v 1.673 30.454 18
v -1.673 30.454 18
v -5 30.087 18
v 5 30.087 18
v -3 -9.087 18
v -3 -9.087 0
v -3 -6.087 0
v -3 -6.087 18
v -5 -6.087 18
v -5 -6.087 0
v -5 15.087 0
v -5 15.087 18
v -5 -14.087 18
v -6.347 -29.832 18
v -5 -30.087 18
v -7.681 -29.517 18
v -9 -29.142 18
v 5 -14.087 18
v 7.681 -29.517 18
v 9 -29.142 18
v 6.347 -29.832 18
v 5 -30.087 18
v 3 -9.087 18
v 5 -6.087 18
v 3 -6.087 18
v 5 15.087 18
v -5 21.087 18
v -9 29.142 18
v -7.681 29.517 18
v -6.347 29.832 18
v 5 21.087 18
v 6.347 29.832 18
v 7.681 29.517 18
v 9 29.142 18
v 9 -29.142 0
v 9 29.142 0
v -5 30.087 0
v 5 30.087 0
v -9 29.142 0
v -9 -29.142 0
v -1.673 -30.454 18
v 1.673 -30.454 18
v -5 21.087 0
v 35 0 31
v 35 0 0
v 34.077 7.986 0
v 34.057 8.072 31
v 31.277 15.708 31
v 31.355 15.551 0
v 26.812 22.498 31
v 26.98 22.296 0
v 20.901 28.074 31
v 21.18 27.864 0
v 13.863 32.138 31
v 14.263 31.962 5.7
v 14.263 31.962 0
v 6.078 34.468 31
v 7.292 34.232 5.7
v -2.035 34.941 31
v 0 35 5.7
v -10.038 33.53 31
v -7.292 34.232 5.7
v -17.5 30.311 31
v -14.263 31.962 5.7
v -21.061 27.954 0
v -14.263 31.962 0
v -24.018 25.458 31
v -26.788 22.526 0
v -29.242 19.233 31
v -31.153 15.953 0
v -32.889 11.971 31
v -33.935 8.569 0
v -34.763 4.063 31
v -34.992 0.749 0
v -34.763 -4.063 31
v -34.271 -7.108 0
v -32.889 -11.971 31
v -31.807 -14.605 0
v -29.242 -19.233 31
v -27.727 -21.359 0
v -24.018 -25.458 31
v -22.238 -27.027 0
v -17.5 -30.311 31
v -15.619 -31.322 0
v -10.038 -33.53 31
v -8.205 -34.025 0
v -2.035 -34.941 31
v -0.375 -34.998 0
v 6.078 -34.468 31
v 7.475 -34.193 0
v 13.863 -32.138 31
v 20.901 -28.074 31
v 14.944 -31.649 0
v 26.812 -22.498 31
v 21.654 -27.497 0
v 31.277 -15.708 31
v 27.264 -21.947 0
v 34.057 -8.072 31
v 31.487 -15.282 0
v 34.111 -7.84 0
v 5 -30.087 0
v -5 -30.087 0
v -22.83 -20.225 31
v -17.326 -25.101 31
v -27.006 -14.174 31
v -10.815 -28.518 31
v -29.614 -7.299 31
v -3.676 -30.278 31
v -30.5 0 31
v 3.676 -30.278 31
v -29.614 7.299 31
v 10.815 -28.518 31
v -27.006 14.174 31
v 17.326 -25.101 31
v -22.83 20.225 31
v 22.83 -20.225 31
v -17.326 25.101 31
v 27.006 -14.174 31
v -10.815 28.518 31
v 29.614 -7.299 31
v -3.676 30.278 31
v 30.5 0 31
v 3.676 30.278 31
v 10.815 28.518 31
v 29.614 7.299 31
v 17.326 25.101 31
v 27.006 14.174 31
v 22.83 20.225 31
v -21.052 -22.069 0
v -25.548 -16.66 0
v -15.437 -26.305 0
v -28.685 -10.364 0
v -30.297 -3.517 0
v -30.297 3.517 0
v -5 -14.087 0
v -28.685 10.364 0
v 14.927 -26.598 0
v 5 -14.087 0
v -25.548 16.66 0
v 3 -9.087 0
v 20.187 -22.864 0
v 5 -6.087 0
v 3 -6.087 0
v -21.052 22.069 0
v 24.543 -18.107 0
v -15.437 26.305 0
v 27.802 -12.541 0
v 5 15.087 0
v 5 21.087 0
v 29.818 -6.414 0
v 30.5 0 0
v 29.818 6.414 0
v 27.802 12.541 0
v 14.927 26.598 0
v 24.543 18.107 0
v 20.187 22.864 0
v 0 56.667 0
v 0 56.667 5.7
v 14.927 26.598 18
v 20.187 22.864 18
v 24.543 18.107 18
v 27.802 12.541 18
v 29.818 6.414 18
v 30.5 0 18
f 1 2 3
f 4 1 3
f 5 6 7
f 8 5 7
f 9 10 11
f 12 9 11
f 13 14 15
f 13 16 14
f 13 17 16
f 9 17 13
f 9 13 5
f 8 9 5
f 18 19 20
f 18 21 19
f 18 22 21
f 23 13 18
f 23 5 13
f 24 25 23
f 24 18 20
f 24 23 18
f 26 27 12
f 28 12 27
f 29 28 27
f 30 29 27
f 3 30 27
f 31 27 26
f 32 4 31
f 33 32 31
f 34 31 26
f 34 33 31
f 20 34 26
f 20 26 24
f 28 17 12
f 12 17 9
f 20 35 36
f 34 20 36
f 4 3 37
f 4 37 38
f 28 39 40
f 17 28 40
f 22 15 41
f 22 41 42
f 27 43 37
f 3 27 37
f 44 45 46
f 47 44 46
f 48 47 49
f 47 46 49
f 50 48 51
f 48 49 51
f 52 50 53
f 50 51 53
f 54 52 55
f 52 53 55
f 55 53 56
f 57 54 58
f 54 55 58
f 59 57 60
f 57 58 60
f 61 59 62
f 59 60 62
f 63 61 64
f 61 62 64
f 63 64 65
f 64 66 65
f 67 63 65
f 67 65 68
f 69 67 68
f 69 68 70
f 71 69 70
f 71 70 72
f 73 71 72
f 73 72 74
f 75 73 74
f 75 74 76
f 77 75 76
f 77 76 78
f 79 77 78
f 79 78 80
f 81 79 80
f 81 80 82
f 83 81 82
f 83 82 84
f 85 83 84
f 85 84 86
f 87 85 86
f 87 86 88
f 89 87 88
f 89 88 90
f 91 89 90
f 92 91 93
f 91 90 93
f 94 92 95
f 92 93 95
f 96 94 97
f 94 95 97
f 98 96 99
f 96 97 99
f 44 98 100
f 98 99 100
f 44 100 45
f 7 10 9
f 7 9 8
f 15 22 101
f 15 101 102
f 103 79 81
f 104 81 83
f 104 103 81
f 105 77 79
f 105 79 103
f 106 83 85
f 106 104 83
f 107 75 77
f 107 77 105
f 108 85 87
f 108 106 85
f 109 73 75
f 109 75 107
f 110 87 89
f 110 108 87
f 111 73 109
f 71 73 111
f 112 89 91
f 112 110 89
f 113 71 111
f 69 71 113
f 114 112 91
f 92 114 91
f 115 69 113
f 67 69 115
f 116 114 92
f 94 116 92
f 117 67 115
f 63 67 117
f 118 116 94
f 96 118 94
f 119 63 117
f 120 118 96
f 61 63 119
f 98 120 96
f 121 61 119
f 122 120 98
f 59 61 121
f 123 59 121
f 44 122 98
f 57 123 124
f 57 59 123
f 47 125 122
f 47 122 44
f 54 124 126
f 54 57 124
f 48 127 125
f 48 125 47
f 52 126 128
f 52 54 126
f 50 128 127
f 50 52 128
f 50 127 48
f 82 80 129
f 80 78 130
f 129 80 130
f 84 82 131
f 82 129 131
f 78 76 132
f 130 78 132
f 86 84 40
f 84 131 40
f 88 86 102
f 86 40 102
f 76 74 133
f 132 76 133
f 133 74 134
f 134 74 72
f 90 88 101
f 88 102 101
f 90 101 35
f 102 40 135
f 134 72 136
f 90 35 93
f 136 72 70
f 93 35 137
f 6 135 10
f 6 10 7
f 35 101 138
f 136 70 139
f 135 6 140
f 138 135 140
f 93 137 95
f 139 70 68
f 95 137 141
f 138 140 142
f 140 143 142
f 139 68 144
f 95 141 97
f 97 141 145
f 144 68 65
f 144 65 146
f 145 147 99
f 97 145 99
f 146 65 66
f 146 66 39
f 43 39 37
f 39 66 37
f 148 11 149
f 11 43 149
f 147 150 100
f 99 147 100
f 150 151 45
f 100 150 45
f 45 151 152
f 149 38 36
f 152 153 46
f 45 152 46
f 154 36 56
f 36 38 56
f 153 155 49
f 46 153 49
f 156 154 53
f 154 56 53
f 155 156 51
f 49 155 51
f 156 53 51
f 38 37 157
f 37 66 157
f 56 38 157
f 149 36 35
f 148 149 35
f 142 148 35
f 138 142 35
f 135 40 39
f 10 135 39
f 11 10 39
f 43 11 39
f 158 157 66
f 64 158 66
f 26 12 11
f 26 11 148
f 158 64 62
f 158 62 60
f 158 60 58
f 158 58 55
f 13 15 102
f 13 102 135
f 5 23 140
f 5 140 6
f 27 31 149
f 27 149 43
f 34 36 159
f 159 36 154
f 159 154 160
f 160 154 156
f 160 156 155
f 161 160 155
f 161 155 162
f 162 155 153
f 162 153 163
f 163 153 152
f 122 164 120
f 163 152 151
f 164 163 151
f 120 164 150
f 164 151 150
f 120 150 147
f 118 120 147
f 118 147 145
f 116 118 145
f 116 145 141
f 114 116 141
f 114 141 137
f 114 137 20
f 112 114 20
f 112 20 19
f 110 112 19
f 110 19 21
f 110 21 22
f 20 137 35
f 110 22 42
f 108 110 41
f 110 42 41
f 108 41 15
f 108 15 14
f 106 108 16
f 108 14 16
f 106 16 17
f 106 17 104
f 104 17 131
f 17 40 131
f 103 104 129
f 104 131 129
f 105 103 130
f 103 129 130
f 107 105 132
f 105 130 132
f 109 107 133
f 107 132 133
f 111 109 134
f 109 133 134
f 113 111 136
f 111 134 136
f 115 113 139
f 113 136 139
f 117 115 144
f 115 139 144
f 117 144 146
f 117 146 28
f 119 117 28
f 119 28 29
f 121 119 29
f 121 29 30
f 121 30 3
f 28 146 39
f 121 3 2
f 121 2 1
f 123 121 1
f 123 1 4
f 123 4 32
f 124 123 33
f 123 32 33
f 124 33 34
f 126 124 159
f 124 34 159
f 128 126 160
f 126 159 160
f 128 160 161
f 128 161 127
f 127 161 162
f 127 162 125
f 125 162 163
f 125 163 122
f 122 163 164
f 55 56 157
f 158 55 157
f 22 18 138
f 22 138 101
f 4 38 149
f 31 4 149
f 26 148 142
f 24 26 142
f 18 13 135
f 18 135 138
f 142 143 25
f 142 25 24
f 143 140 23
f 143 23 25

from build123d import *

# Parameters (mm, degrees)
F0_R     = 35
F0_W     = 2
F0_H     = 3
F1_DEPTH = 18
F2_R     = 35
F2_R_2   = 30.5
F3_DEPTH = 31
F5_DEPTH = 5.7


with BuildPart() as f1:
    # F0 (on Top) → F1 (new body)
    with BuildSketch(Plane.XY):
        Circle(F0_R)
        with BuildLine():
            ThreePointArc((-5, 30.0873727667), (0, 30.5), (5, 30.0873727667))
            Line((5, 30.0873727667), (9, 30.0873727667))
            Line((9, 30.0873727667), (9, 29.1418942418))
            ThreePointArc((9, 29.1418942418), (24.5433290325, 18.1073189622), (30.5, 0))
            ThreePointArc((30.5, 0), (24.5433290325, -18.1073189622), (9, -29.1418942418))
            ThreePointArc((9, -29.1418942418), (7.0159448694, -29.6820908561), (5, -30.0873727667))
            ThreePointArc((5, -30.0873727667), (0, -30.5), (-5, -30.0873727667))
            Line((-5, -30.0873727667), (-9, -30.0876272333))
            Line((-9, -30.0876272333), (-9, -29.1418942418))
            ThreePointArc((-9, -29.1418942418), (-30.5, 0), (-9, 29.1418942418))
            Line((-9, 29.1418942418), (-9, 30.0873727667))
            Line((-9, 30.0873727667), (-5, 30.0873727667))
        make_face(mode=Mode.SUBTRACT)
        with BuildLine():
            Line((-5, 30.0873727667), (5, 30.0873727667))
            ThreePointArc((5, 30.0873727667), (0, 30.5), (-5, 30.0873727667))
        make_face()
        with BuildLine():
            Line((9, 30.0873727667), (5, 30.0873727667))
            ThreePointArc((5, 30.0873727667), (7.0159448694, 29.6820908561), (9, 29.1418942418))
            Line((9, 29.1418942418), (9, 30.0873727667))
        make_face()
        with BuildLine():
            ThreePointArc((9, 29.1418942418), (7.0159448694, 29.6820908561), (5, 30.0873727667))
            Line((5, 30.0873727667), (5, 21.0873727667))
            Line((5, 21.0873727667), (5, 15.0873727667))
            Line((5, 15.0873727667), (5, -6.0873727667))
            Line((5, -6.0873727667), (5, -9.0873727667))
            Line((5, -9.0873727667), (5, -14.0873727667))
            Line((5, -14.0873727667), (5, -30.0873727667))
            ThreePointArc((5, -30.0873727667), (7.0159448694, -29.6820908561), (9, -29.1418942418))
            Line((9, -29.1418942418), (9, 29.1418942418))
        make_face()
        with BuildLine():
            Line((-5, 21.0873727667), (-5, 30.0873727667))
            ThreePointArc((-5, 30.0873727667), (-7.0159448694, 29.6820908561), (-9, 29.1418942418))
            Line((-9, 29.1418942418), (-9, -29.1418942418))
            ThreePointArc((-9, -29.1418942418), (-7.0159448694, -29.6820908561), (-5, -30.0873727667))
            Line((-5, -30.0873727667), (-5, -14.0873727667))
            Line((-5, -14.0873727667), (-5, -9.0873727667))
            Line((-5, -9.0873727667), (-5, -6.0873727667))
            Line((-5, -6.0873727667), (-5, 15.0873727667))
            Line((-5, 15.0873727667), (-5, 21.0873727667))
        make_face()
        with BuildLine():
            ThreePointArc((-9, 29.1418942418), (-7.0159448694, 29.6820908561), (-5, 30.0873727667))
            Line((-5, 30.0873727667), (-9, 30.0873727667))
            Line((-9, 30.0873727667), (-9, 29.1418942418))
        make_face()
        Polygon((5, 15.0873727667), (5, 21.0873727667), (0, 21.0873727667), (-5, 21.0873727667), (-5, 15.0873727667), (0, 15.0873727667), align=None)
        with BuildLine():
            ThreePointArc((-5, -30.0873727667), (-7.0159448694, -29.6820908561), (-9, -29.1418942418))
            Line((-9, -29.1418942418), (-9, -30.0876272333))
            Line((-9, -30.0876272333), (-5, -30.0873727667))
        make_face()
        with BuildLine():
            ThreePointArc((-5, -30.0873727667), (0, -30.5), (5, -30.0873727667))
            Line((5, -30.0873727667), (-5, -30.0873727667))
        make_face()
        with Locations((4, -7.5873727667)):
            Rectangle(F0_W, F0_H)
        with Locations((-4, -7.5873727667)):
            Rectangle(F0_W, F0_H)
        Polygon((0, -14.0873727667), (5, -14.0873727667), (5, -9.0873727667), (3, -9.0873727667), (0, -9.0873727667), (-3, -9.0873727667), (-5, -9.0873727667), (-5, -14.0873727667), align=None)
    extrude(amount=F1_DEPTH)

    # F2 (on Top) → F3 (join)
    with BuildSketch(Plane.XY):
        Circle(F2_R)
        Circle(F2_R_2, mode=Mode.SUBTRACT)
    extrude(amount=F3_DEPTH)

    # F4 (on Top) → F5 (join)
    with BuildSketch(Plane.XY):
        with BuildLine():
            ThreePointArc((-14.2633631023, 31.9617970867), (0, 35), (14.2633631023, 31.9617970867))
            Line((14.2633631023, 31.9617970867), (0, 56.6666666667))
            Line((0, 56.6666666667), (-14.2633631023, 31.9617970867))
        make_face()
    extrude(amount=F5_DEPTH)


solid = f1.part
